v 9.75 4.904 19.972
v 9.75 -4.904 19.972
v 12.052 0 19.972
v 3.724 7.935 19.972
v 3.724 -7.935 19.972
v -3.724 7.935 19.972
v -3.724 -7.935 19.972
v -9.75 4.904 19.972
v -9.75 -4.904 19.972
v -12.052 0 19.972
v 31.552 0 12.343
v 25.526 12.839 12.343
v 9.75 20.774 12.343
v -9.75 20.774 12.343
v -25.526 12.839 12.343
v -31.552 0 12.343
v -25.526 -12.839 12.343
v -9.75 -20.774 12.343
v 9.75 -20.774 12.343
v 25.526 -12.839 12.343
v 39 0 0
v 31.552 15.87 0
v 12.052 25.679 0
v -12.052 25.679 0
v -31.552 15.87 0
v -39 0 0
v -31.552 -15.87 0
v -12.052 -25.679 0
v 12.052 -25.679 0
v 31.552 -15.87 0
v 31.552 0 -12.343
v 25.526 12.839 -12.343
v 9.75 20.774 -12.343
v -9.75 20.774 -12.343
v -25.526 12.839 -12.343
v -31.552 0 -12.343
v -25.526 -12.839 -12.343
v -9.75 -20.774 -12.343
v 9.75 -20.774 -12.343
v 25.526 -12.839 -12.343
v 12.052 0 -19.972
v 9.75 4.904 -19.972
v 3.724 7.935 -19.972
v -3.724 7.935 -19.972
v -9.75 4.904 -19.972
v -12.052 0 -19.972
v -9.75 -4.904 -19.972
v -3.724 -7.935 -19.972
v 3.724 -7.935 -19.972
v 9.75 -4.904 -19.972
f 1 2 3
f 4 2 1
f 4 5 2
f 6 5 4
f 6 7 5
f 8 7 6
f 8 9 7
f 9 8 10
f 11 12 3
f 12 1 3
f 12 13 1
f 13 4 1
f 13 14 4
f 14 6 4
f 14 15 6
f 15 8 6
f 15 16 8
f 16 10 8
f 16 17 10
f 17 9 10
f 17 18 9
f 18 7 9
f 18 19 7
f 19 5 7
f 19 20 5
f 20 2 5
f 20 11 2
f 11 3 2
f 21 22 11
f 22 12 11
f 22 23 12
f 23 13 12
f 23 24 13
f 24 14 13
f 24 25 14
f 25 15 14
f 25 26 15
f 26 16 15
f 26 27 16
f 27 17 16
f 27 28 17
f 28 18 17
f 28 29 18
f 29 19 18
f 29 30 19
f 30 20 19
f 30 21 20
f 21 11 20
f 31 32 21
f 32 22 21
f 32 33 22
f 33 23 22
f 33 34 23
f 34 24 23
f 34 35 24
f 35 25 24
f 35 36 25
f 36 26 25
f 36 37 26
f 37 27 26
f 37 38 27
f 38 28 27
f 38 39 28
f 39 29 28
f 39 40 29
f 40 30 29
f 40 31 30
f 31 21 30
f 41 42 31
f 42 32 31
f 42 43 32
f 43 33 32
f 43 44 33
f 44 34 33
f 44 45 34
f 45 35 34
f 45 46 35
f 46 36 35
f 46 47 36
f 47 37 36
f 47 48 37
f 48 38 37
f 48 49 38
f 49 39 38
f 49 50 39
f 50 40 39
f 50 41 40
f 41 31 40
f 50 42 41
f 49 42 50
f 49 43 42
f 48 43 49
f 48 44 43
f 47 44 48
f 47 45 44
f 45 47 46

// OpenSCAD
// Generated by SolidPython 1.0.1 on 2020-07-29 00:46:50


scale(v = [13, 9, 7]) {
	sphere(r = 3);
}
/***********************************************
*********      SolidPython code:      **********
************************************************
 
# import packages: SolidPython
from solid import *
from solid.utils import *
from itertools import chain, combinations, permutations


class Resize:

    def __init__(self, scad_file):
        self.scad_file = scad_file
        #self.scad_file = import_scad(scad_file)
        # cone/cylinder param:
        self.r1 = 0
        self.r2 = 0
        self.h = 0
        # rectangular prism param:
        self.w = 0
        self.l = 0
        # ellipse param:
        self.r = 0

    # import OpenScad code (file name corresponds to shape)


    # classify shape + parameters
    def assign(self, param1, param2, param3):
        if self.scad_file == 'cone.scad':
            self.r1 = param1
            self.r2 = param2
            self.h = param3
        elif self.scad_file == 'cylinder.scad':
            self.r1 = param1
            self.r2 = param2
            self.h = param3
        elif self.scad_file == 'rectangularPrism.scad':
            self.h = param1
            self.l = param2
            self.w = param3
        else:
            self.r = param1
            self.h = param2

    # resize parameters
    def iterate(self):
        x = range(3, 20, 2)
        i = 1
        if self.scad_file == 'cone.scad':
            tempList = list(permutations(x, 2))
            for temp in tempList:
                param1 = temp[0]
                param2 = temp[1]
                filepath = 'produced_scad_files/' + 'cone' + str(param1) + '_' + str(param2) + '_' + '.scad'
                scad_render_to_file(cylinder(h=param1, r1=param2, r2=0), filepath)

        elif self.scad_file == 'cylinder.scad':
            tempList = list(permutations(x, 3))
            for temp in tempList:
                param1 = temp[0]
                param2 = temp[1]
                filepath = 'produced_scad_files/' + 'cylinder' + str(param1) + '_' + str(param2) + '_' + '.scad'
                scad_render_to_file(cylinder(h=param1, r1=param2, r2=param2), filepath)

        elif self.scad_file == 'rectangularPrism.scad':
            tempList = list(permutations(x, 3))
            for temp in tempList:
                param1 = temp[0]
                param2 = temp[1]
                param3 = temp[2]
                filepath = 'produced_scad_files/' + 'rectangularPrism' + str(param1) + '_' + str(param2) + '_' + str(
                    param3) + '.scad'
                scad_render_to_file(cube(size=(param1, param2, param3)), filepath)

        elif self.scad_file == 'ellipse.scad':
            tempList = list(permutations(x, 4))
            for temp in tempList:
                param1 = temp[0]
                param2 = temp[1]
                param3 = temp[2]
                param4 = temp[3]
                filepath = 'produced_scad_files/' + 'ellipse' + str(param1) + '_' + str(param2) + '_' + str(param3) + '_' + str(param4) + '.scad'
                scad_render_to_file(scale([param1, param2, param3])(sphere(r=param4)), filepath)

    def render_to_scadfile(self):
        scad_render_to_file(scad, 'example.scad') 
 
************************************************/
